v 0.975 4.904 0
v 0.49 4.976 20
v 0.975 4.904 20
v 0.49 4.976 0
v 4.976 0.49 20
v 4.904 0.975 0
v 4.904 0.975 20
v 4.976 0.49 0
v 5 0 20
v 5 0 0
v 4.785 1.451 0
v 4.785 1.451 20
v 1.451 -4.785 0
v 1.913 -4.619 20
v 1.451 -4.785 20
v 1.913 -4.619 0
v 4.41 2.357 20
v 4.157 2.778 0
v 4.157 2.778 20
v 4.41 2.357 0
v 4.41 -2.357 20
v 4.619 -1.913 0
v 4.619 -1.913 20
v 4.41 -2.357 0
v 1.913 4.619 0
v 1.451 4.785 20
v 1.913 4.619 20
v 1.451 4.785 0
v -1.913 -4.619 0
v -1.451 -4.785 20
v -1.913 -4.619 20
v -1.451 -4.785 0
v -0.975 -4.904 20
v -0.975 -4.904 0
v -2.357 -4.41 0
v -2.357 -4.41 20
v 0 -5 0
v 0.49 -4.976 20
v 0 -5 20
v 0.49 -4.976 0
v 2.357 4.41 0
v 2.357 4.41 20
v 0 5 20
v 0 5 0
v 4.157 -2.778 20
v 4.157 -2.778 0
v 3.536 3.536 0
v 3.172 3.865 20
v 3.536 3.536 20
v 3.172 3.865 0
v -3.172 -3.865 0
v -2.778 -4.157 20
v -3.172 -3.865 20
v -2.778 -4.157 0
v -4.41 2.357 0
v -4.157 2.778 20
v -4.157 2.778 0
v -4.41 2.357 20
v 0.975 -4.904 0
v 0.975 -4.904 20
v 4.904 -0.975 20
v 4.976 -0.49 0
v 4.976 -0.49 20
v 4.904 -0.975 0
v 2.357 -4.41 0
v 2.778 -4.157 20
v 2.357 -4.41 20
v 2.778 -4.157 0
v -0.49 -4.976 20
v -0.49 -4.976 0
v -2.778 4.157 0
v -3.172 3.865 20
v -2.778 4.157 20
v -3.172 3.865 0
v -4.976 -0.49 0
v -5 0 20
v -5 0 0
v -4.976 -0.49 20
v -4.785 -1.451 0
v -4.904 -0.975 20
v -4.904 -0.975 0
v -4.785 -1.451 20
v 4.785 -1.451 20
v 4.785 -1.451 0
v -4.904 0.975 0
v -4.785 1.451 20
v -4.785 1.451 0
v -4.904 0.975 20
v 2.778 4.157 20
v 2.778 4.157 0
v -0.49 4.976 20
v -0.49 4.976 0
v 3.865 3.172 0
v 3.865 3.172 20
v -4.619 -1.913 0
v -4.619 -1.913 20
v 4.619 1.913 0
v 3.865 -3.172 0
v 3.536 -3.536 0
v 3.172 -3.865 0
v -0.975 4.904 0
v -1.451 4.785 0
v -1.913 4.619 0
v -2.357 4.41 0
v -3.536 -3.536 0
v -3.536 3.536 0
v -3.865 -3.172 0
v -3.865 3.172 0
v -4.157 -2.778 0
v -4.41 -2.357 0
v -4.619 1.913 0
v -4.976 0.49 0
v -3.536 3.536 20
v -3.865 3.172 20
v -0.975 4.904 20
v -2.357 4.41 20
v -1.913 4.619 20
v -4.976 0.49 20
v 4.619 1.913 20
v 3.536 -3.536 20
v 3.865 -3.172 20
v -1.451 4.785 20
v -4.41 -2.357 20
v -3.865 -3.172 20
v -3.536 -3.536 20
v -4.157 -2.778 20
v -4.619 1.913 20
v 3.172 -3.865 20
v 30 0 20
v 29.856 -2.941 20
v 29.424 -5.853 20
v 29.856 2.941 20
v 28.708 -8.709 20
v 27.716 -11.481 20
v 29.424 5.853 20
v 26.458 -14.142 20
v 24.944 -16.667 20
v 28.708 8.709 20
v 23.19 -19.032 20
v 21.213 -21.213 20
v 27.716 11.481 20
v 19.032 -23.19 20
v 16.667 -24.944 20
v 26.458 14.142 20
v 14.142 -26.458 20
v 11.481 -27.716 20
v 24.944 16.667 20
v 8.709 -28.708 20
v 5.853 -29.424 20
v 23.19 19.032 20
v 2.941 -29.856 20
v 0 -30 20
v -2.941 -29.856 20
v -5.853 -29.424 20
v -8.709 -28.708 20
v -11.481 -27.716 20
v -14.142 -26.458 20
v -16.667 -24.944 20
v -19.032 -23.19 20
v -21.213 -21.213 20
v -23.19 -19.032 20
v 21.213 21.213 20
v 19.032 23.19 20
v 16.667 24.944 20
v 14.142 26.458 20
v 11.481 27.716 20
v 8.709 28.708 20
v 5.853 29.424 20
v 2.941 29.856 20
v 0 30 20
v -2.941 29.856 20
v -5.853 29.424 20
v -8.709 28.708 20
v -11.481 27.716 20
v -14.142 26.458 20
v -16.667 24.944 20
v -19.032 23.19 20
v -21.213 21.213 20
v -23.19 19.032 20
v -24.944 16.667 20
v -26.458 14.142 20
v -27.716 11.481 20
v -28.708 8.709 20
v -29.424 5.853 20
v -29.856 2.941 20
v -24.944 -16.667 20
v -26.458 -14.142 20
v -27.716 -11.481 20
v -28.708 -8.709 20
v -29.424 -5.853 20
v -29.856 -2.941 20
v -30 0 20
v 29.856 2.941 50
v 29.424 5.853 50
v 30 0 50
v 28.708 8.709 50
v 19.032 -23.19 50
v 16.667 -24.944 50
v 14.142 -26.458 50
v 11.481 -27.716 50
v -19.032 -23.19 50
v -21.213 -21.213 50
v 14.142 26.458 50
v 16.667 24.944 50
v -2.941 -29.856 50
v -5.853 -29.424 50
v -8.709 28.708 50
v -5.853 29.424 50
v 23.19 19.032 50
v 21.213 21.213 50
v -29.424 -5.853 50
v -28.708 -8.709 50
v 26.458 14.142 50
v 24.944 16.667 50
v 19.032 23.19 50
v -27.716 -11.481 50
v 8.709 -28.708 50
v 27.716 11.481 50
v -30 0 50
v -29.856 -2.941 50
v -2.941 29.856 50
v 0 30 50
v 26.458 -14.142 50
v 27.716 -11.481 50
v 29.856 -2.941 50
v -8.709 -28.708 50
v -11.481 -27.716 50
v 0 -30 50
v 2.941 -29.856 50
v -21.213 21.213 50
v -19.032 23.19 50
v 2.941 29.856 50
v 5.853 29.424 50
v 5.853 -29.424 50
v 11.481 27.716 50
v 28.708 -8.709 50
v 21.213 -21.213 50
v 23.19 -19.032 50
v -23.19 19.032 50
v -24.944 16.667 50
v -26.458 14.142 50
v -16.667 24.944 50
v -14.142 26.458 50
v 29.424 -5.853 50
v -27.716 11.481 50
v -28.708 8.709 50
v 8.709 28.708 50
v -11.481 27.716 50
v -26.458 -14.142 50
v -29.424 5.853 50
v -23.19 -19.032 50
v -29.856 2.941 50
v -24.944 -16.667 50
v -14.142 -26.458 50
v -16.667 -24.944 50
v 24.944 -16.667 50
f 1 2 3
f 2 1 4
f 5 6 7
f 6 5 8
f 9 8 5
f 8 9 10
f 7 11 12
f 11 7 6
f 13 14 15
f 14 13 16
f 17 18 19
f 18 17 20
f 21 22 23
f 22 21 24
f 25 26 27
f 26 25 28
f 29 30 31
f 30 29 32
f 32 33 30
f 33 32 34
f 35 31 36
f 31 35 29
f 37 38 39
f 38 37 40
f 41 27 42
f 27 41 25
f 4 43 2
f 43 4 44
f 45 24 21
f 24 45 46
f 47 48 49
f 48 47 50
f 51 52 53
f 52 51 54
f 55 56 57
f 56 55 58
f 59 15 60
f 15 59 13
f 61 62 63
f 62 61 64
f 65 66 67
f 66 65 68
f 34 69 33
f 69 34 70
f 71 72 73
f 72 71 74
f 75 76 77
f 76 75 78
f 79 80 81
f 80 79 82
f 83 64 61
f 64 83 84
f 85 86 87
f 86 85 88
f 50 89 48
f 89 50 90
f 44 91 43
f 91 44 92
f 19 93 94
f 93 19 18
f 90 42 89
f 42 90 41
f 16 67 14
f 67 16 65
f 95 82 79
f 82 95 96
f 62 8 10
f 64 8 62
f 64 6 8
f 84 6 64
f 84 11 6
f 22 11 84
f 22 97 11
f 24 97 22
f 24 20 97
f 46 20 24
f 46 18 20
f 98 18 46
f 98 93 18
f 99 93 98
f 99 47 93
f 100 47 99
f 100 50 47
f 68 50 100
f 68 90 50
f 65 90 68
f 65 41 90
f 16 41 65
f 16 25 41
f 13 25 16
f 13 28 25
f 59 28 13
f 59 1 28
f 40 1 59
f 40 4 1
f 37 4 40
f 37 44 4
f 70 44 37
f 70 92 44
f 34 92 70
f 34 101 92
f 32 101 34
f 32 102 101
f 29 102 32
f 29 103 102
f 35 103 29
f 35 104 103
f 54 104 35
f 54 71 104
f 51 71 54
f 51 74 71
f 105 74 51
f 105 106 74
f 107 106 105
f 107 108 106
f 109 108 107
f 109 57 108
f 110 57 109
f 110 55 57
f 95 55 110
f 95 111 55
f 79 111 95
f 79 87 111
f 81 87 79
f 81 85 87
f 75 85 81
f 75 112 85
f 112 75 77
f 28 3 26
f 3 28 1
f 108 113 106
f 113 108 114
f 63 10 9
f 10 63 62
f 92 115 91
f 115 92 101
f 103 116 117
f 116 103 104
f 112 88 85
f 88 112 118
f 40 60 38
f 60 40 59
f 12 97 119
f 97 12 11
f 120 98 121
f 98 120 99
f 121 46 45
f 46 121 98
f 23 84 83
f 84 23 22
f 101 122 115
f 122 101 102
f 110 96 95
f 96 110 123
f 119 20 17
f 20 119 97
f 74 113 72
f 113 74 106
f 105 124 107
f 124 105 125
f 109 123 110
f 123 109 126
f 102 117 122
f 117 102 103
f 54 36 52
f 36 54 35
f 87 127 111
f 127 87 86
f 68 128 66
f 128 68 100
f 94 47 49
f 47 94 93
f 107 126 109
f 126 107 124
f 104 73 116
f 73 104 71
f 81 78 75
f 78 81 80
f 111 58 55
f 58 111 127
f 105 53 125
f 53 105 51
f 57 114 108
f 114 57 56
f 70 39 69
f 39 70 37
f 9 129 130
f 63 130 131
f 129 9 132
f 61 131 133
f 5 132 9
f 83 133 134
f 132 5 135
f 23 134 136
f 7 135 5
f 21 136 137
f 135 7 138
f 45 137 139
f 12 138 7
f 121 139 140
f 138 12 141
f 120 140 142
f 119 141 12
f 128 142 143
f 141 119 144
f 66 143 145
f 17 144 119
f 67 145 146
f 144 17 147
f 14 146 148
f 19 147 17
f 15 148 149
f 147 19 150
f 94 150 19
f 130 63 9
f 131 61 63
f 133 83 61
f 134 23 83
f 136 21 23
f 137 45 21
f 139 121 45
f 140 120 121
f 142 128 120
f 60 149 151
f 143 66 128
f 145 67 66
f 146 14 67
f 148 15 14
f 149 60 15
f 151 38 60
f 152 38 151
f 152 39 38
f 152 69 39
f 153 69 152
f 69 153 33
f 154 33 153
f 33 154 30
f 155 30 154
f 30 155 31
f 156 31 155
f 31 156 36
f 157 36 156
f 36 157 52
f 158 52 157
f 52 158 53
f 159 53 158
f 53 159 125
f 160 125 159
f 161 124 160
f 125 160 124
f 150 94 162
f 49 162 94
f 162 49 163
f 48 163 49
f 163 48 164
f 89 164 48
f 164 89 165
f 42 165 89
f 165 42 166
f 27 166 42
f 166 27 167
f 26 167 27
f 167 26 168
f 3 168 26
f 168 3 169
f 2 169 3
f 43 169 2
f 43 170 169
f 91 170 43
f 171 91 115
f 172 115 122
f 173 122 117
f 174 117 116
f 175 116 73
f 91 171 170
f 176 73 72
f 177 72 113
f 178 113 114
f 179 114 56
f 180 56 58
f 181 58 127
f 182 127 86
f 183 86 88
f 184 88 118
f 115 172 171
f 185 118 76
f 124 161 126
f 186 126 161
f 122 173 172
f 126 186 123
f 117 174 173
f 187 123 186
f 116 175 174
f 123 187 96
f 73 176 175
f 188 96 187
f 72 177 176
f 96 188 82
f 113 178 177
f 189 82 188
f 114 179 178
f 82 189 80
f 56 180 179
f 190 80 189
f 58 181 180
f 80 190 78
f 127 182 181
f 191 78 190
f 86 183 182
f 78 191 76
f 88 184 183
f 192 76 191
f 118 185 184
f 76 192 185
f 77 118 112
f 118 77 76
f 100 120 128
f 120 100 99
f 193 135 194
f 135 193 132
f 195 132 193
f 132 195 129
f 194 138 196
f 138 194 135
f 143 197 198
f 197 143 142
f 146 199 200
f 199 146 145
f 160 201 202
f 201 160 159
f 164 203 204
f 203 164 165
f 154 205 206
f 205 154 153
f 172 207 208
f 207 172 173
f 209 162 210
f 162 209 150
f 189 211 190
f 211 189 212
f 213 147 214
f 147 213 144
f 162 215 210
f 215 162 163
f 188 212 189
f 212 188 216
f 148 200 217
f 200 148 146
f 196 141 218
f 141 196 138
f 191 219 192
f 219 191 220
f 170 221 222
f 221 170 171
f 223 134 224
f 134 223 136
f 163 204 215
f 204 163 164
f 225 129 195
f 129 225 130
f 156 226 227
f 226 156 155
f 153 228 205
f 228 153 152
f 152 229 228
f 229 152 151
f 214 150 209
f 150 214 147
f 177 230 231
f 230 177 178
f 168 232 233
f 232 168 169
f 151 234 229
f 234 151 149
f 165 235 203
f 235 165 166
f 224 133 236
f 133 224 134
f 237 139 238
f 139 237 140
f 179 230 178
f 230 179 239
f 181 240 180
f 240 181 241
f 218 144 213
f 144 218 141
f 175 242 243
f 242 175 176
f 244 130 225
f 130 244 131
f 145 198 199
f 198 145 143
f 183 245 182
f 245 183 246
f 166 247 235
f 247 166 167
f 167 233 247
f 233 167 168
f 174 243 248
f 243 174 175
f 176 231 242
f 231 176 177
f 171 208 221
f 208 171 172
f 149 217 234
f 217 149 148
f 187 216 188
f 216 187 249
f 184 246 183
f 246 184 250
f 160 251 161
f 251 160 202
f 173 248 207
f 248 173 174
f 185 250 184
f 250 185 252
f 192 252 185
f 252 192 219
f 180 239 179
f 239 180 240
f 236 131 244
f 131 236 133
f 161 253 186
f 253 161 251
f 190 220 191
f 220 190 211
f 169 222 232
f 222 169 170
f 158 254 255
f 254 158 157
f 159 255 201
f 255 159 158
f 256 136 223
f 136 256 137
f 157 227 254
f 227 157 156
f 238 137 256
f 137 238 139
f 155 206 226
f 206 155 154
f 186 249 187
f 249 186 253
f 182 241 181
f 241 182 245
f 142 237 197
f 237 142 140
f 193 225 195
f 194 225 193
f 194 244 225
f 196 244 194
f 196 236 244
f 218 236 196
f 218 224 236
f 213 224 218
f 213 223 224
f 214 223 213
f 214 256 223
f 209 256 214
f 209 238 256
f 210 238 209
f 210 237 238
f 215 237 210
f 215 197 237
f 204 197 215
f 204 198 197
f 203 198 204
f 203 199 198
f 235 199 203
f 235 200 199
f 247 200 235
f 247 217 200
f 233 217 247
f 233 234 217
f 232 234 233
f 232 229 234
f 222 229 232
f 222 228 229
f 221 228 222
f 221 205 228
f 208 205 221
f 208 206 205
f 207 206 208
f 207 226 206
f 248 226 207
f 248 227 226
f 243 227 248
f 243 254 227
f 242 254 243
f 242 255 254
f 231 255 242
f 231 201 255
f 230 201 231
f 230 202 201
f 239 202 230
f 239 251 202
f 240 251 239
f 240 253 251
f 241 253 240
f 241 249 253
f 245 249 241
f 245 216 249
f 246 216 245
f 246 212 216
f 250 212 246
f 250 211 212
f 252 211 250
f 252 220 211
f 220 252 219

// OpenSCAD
// Lab funnel design
// Dimensions in millimeters

// Main dimensions
spout_height = 20;
cone_height = 30;
total_height = spout_height + cone_height;
spout_outer_dia = 10;
spout_inner_dia = 6.8;
cone_outer_dia = 60;
wall_thickness = 1.6;

// Derived dimensions
spout_radius = spout_outer_dia / 2;
spout_inner_radius = spout_inner_dia / 2;
cone_radius = cone_outer_dia / 2;
cone_inner_radius = cone_outer_dia / 2 - wall_thickness;

// Create the funnel
union() {
    // Outer cone
    cylinder(r = spout_radius, h = spout_height, $fn = 64);
    translate([0, 0, spout_height]) {
        cylinder(r = cone_radius, h = cone_height, $fn = 64);
    }
    
    // Inner spout
    difference() {
        cylinder(r = spout_inner_radius, h = spout_height + 0.01, $fn = 64);
        translate([0, 0, -0.01]) {
            cylinder(r = spout_inner_radius, h = spout_height + 0.02, $fn = 64);
        }
    }
    
    // Inner cone
    difference() {
        translate([0, 0, spout_height]) {
            cylinder(r = cone_inner_radius, h = cone_height + 0.01, $fn = 64);
        }
        translate([0, 0, spout_height - 0.01]) {
            cylinder(r = cone_inner_radius, h = cone_height + 0.02, $fn = 64);
        }
    }
}
